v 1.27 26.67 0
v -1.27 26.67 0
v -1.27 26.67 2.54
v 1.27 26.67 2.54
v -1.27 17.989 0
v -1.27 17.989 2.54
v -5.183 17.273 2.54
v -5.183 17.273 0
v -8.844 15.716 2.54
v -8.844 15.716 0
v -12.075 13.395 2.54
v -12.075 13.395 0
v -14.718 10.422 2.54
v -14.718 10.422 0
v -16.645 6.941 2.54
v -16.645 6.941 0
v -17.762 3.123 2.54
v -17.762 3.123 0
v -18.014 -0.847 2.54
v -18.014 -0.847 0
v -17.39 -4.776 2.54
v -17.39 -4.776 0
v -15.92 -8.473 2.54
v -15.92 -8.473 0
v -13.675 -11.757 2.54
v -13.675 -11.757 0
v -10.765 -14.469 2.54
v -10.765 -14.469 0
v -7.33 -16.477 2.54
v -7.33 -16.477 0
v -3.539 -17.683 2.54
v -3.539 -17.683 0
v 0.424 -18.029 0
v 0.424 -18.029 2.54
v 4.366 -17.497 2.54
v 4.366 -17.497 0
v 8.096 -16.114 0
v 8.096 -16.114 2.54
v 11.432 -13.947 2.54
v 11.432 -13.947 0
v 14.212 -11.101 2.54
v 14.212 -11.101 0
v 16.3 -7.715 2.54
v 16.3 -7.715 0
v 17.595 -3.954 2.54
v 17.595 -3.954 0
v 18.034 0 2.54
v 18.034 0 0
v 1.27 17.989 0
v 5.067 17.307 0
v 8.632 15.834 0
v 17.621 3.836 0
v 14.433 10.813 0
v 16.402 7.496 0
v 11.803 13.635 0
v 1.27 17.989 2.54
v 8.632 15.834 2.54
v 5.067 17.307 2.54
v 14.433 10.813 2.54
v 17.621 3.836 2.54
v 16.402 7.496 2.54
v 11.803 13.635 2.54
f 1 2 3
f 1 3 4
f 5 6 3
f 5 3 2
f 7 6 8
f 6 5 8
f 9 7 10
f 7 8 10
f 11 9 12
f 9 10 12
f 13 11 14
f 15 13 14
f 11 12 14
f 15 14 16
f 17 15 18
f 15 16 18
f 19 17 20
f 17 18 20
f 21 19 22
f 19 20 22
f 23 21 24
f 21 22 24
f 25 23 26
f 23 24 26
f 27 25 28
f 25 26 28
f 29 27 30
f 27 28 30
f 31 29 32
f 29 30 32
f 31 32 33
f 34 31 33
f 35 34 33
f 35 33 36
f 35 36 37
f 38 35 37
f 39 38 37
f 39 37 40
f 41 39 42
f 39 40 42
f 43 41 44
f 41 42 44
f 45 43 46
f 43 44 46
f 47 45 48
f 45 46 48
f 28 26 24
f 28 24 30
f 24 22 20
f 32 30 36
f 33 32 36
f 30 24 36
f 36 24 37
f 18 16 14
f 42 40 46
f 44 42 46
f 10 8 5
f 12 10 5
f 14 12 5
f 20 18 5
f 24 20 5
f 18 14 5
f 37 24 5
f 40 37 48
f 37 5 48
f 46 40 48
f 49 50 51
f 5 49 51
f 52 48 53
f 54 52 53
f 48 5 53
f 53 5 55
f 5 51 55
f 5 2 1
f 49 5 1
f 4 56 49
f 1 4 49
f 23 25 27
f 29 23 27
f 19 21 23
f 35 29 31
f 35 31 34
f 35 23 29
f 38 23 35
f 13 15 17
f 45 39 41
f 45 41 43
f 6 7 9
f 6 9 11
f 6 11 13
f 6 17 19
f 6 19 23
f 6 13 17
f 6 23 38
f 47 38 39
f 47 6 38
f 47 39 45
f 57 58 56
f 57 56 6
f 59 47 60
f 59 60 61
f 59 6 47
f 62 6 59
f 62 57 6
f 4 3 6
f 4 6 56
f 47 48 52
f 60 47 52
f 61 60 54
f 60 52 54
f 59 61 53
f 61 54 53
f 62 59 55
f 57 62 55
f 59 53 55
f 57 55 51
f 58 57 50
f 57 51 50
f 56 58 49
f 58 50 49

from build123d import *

# Parameters (mm, degrees)
SKETCH1_R           = 18.034
BOSS_EXTRUDE1_DEPTH = 2.54
SKETCH2_W           = 2.54
SKETCH2_H           = 2.54
BOSS_EXTRUDE2_DEPTH = 8.89


with BuildPart() as part:
    # Sketch1 → Boss-Extrude1 (new body)
    with BuildSketch(Plane.XY):
        Circle(SKETCH1_R)
    extrude(amount=BOSS_EXTRUDE1_DEPTH)


with BuildPart() as body_2:
    # Sketch2 → Boss-Extrude2 (new body)
    with BuildSketch(Plane(origin=(0, 17.78, 0), x_dir=(1, 0, 0), z_dir=(0, 1, 0))):
        with Locations((0, -1.27)):
            Rectangle(SKETCH2_W, SKETCH2_H)
    extrude(amount=BOSS_EXTRUDE2_DEPTH)


with BuildPart() as part_1:
    add(part.part)

    # Combine1: union body 2
    add(body_2.part)


solid = part_1.part
